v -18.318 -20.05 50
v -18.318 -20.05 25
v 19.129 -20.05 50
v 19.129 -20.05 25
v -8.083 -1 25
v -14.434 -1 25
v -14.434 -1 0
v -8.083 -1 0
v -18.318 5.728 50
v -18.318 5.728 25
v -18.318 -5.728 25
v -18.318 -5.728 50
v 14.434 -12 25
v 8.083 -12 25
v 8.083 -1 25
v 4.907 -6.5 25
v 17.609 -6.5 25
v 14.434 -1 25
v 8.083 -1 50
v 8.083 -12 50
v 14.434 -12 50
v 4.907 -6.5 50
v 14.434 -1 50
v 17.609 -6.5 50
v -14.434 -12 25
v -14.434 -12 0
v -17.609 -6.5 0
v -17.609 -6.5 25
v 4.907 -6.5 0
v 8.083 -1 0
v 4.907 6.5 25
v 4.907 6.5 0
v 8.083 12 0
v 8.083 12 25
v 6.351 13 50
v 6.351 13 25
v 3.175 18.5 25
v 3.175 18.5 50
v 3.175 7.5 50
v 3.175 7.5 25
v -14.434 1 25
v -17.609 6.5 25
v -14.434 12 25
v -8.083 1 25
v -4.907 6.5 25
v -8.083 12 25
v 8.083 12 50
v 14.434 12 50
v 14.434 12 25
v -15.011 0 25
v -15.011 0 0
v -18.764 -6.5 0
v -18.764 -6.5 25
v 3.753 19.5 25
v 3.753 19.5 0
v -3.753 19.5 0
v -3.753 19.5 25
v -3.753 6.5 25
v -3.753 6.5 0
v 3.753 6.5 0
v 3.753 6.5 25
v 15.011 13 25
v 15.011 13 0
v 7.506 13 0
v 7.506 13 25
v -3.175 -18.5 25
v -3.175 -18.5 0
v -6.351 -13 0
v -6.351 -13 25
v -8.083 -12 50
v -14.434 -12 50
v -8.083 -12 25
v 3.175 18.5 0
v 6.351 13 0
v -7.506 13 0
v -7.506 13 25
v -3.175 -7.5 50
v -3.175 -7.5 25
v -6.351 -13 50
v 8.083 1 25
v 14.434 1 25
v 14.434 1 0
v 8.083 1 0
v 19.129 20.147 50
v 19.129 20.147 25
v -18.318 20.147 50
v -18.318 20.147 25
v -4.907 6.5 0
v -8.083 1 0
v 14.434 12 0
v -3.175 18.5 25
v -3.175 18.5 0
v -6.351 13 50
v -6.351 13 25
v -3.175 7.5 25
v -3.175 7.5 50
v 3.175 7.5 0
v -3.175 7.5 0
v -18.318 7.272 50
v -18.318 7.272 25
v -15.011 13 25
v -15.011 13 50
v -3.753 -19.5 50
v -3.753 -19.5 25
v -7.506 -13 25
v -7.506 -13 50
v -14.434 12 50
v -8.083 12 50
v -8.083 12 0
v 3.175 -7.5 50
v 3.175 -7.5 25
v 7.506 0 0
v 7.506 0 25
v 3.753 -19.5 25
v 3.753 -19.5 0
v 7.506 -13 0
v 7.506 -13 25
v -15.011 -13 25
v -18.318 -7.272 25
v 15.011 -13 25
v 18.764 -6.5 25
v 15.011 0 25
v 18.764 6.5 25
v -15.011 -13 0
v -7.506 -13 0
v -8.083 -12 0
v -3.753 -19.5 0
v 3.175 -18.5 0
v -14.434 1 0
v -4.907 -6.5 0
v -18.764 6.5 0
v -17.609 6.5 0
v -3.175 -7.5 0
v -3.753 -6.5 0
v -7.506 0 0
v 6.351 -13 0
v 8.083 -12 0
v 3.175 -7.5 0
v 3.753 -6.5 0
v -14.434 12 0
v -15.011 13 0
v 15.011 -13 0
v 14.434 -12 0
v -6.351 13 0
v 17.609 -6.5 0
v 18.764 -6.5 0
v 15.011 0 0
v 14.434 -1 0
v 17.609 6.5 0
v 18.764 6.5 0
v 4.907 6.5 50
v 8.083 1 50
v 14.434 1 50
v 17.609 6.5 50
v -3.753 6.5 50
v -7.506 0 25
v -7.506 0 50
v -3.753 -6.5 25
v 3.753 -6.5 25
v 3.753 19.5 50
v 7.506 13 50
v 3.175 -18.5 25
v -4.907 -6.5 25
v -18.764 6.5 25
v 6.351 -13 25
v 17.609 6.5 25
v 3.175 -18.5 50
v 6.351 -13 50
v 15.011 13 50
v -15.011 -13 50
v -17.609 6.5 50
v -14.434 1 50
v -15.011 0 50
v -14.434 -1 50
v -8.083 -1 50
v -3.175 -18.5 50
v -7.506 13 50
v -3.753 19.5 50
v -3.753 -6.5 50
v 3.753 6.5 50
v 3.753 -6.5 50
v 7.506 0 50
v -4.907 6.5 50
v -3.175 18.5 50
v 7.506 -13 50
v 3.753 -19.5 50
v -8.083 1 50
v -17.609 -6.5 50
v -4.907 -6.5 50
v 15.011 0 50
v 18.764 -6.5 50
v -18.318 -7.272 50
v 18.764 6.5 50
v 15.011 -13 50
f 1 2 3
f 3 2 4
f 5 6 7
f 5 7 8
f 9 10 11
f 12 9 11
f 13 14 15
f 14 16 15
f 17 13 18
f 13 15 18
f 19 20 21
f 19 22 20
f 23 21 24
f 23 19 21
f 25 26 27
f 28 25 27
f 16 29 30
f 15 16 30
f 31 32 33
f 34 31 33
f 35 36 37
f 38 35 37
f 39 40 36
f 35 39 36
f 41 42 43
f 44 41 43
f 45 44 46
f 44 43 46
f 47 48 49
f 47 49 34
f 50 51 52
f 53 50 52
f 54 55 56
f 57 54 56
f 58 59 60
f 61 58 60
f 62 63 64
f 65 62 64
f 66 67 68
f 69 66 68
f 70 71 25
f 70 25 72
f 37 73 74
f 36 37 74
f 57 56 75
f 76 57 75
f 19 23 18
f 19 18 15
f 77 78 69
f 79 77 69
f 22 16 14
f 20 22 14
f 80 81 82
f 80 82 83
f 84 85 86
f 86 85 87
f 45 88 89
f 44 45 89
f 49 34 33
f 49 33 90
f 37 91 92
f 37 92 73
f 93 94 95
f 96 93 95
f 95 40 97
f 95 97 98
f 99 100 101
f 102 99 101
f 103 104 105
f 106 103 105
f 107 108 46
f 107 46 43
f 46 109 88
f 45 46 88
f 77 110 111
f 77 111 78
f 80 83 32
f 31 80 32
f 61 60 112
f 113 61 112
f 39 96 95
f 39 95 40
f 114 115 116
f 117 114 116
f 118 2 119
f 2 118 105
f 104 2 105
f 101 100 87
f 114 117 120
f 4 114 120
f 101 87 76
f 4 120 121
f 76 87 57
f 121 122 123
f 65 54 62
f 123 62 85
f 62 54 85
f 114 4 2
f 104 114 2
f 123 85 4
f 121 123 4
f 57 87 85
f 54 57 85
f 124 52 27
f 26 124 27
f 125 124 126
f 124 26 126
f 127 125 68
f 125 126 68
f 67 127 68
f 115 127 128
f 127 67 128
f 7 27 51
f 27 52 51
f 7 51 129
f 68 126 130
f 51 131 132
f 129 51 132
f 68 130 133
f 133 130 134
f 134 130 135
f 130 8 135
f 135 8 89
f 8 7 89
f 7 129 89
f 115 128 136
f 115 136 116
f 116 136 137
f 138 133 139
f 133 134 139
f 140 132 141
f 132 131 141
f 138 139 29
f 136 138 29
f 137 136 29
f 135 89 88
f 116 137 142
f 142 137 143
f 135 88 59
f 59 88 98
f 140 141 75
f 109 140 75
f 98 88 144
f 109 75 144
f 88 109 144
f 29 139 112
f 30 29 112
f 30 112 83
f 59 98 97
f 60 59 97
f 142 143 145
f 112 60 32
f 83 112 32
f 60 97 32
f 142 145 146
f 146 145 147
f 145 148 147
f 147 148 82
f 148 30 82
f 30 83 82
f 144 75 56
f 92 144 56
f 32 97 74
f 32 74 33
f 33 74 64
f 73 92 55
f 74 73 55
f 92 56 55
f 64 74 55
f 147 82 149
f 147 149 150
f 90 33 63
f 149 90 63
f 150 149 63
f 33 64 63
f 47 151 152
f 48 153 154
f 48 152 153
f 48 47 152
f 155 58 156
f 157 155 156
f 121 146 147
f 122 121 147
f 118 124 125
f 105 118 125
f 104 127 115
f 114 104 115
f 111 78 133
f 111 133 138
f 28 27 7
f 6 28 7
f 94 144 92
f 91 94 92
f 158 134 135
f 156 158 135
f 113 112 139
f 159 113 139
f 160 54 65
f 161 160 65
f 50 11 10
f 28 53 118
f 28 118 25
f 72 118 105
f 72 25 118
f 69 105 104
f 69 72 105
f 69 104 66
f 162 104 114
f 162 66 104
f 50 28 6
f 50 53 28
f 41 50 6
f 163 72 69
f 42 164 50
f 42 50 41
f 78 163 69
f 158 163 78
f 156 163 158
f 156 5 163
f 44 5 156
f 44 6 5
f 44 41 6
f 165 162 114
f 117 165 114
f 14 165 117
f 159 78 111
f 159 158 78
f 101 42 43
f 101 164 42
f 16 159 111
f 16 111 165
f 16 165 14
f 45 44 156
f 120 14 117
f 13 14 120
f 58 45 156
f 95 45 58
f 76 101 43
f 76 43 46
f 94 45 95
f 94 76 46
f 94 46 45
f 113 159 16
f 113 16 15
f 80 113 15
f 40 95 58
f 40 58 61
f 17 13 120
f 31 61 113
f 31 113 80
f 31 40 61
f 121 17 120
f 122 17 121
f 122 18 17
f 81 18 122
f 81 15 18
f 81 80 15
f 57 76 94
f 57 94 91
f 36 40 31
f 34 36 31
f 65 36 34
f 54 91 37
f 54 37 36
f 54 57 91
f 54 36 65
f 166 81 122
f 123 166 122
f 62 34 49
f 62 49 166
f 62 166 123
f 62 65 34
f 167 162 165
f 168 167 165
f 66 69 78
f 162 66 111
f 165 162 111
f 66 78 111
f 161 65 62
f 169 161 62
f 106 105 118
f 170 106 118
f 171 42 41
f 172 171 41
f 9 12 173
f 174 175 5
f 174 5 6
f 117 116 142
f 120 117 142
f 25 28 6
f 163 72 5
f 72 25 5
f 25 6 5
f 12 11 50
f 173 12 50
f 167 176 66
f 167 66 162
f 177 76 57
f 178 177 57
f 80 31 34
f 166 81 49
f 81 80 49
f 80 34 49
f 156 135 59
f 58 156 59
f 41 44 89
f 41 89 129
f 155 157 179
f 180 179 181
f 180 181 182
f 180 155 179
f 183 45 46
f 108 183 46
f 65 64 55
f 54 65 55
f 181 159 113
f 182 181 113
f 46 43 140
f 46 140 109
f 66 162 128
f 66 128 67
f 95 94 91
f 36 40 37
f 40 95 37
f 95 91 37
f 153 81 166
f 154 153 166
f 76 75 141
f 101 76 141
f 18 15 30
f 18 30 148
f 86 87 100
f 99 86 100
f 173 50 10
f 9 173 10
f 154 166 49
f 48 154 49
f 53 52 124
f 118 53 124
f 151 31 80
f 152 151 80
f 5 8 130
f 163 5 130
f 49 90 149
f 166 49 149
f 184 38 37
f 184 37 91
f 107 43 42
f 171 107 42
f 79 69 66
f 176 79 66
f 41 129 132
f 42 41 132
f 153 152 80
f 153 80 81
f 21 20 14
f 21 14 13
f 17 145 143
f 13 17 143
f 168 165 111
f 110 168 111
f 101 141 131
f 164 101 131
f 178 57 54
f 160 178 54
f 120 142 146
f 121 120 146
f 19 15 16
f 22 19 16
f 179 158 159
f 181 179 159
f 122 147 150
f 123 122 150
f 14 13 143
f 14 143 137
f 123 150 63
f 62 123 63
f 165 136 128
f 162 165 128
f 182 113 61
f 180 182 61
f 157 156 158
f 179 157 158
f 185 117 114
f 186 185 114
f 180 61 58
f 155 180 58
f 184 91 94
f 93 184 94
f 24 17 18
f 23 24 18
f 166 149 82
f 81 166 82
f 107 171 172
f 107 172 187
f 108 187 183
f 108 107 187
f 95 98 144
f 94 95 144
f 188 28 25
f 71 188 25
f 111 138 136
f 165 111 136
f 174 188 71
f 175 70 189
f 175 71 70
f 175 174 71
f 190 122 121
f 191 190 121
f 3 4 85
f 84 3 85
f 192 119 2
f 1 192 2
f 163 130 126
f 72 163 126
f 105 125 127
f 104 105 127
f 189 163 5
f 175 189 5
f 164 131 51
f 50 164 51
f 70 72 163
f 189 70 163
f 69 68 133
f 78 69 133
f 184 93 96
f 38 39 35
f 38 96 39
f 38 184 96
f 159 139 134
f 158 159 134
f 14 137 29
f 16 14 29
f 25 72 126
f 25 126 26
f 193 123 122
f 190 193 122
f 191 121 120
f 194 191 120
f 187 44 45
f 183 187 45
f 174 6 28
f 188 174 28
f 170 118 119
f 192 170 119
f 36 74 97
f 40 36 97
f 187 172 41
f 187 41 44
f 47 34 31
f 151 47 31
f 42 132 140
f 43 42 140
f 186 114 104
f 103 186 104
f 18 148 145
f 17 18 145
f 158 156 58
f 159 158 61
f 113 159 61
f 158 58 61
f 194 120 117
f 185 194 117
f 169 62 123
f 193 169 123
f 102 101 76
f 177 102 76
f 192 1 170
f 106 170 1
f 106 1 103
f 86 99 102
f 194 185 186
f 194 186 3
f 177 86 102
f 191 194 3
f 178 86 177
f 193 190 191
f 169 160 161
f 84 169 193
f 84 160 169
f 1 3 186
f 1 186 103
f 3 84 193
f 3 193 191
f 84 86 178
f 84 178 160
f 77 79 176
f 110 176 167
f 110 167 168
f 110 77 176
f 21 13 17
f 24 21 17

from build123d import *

# Parameters (mm, degrees)
F1_DEPTH = 25
F3_DEPTH = 25
F6_DEPTH = 25


with BuildPart() as f1:
    # F0 (on Top) → F1 (new body)
    with BuildSketch(Plane.XY):
        Polygon((-7.5055534995, 13), (-3.7527767497, 6.5), (3.7527767497, 6.5), (7.5055534995, 13), (3.7527767497, 19.5), (-3.7527767497, 19.5), align=None)
        Polygon((-3.1754264805, 7.5), (-6.3508529611, 13), (-3.1754264805, 18.5), (3.1754264805, 18.5), (6.3508529611, 13), (3.1754264805, 7.5), align=None, mode=Mode.SUBTRACT)
        Polygon((-7.5055534995, 0), (-3.7527767497, 6.5), (-7.5055534995, 13), (-15.0111069989, 13), (-18.7638837487, 6.5), (-15.0111069989, 0), align=None)
        Polygon((-8.0829037687, 1), (-14.4337567297, 1), (-17.6091832103, 6.5), (-14.4337567297, 12), (-8.0829037687, 12), (-4.9074772881, 6.5), align=None, mode=Mode.SUBTRACT)
        Polygon((7.5055534995, 13), (3.7527767497, 6.5), (7.5055534995, 0), (15.0111069989, 0), (18.7638837487, 6.5), (15.0111069989, 13), align=None)
        Polygon((8.0829037687, 1), (4.9074772881, 6.5), (8.0829037687, 12), (14.4337567297, 12), (17.6091832103, 6.5), (14.4337567297, 1), align=None, mode=Mode.SUBTRACT)
        Polygon((-3.7527767497, -6.5), (-7.5055534995, 0), (-15.0111069989, 0), (-18.7638837487, -6.5), (-15.0111069989, -13), (-7.5055534995, -13), align=None)
        Polygon((-14.4337567297, -12), (-17.6091832103, -6.5), (-14.4337567297, -1), (-8.0829037687, -1), (-4.9074772881, -6.5), (-8.0829037687, -12), align=None, mode=Mode.SUBTRACT)
        Polygon((15.0111069989, 0), (7.5055534995, 0), (3.7527767497, -6.5), (7.5055534995, -13), (15.0111069989, -13), (18.7638837487, -6.5), align=None)
        Polygon((8.0829037687, -12), (4.9074772881, -6.5), (8.0829037687, -1), (14.4337567297, -1), (17.6091832103, -6.5), (14.4337567297, -12), align=None, mode=Mode.SUBTRACT)
        Polygon((3.7527767497, -6.5), (-3.7527767497, -6.5), (-7.5055534995, -13), (-3.7527767497, -19.5), (3.7527767497, -19.5), (7.5055534995, -13), align=None)
        Polygon((3.1754264805, -18.5), (-3.1754264805, -18.5), (-6.3508529611, -13), (-3.1754264805, -7.5), (3.1754264805, -7.5), (6.3508529611, -13), align=None, mode=Mode.SUBTRACT)
    extrude(amount=F1_DEPTH)

    # F2 (on face) → F3 (join)
    with BuildSketch(Plane.XY.offset(25)):
        Polygon((3.7527767497, -19.5), (7.5055534995, -13), (15.0111069989, -13), (18.7638837487, -6.5), (15.0111069989, 0), (18.7638837487, 6.5), (15.0111069989, 13), (7.5055534995, 13), (3.7527767497, 19.5), (-3.7527767497, 19.5), (-7.5055534995, 13), (-15.0111069989, 13), (-18.7638837487, 6.5), (-15.0111069989, 0), (-18.7638837487, -6.5), (-15.0111069989, -13), (-7.5055534995, -13), (-3.7527767497, -19.5), align=None)
        Polygon((-8.0829037687, -1), (-4.9074772881, -6.5), (-8.0829037687, -12), (-14.4337567297, -12), (-17.6091832103, -6.5), (-14.4337567297, -1), align=None, mode=Mode.SUBTRACT)
        Polygon((-6.3508529611, -13), (-3.1754264805, -7.5), (3.1754264805, -7.5), (6.3508529611, -13), (3.1754264805, -18.5), (-3.1754264805, -18.5), align=None, mode=Mode.SUBTRACT)
        Polygon((17.6091832103, -6.5), (14.4337567297, -12), (8.0829037687, -12), (4.9074772881, -6.5), (8.0829037687, -1), (14.4337567297, -1), align=None, mode=Mode.SUBTRACT)
        Polygon((-14.4337567297, 12), (-8.0829037687, 12), (-4.9074772881, 6.5), (-8.0829037687, 1), (-14.4337567297, 1), (-17.6091832103, 6.5), align=None, mode=Mode.SUBTRACT)
        Polygon((3.1754264805, 18.5), (6.3508529611, 13), (3.1754264805, 7.5), (-3.1754264805, 7.5), (-6.3508529611, 13), (-3.1754264805, 18.5), align=None, mode=Mode.SUBTRACT)
        Polygon((-7.5055534995, 0), (-3.7527767497, 6.5), (3.7527767497, 6.5), (7.5055534995, 0), (3.7527767497, -6.5), (-3.7527767497, -6.5), align=None, mode=Mode.SUBTRACT)
        Polygon((14.4337567297, 12), (17.6091832103, 6.5), (14.4337567297, 1), (8.0829037687, 1), (4.9074772881, 6.5), (8.0829037687, 12), align=None, mode=Mode.SUBTRACT)
    extrude(amount=-F3_DEPTH)


with BuildPart() as f6:
    # F5 (on face) → F6 (new body)
    with BuildSketch(Plane.XY.offset(25)):
        Polygon((-15.0111069989, 0), (-18.3182880282, 5.7282055726), (-18.3182880282, -5.7282055726), align=None)
    extrude(amount=F6_DEPTH)


with BuildPart() as f6b:
    # F5 (on face) → F6, piece 2 (new body)
    with BuildSketch(Plane.XY.offset(25)):
        Polygon((-18.3182880282, -20.0500637293), (8.5395220667, -20.0500637293), (8.5395220667, -13), (7.5055534995, -13), (3.7527767497, -19.5), (-3.7527767497, -19.5), (-7.5055534995, -13), (-15.0111069989, -13), (-18.3182880282, -7.2717944274), (-18.3182880282, -19.2839857191), align=None)
        Polygon((19.1294308752, 20.1465263963), (8.5395220667, 20.1465263963), (8.5395220667, 13), (15.0111069989, 13), (18.7638837487, 6.5), (15.0111069989, 0), (18.7638837487, -6.5), (15.0111069989, -13), (8.5395220667, -13), (8.5395220667, -20.0500637293), (19.1294308752, -20.0500637293), align=None)
        Polygon((8.5395220667, 20.1465263963), (-18.3182880282, 20.1465263963), (-18.3182880282, 7.2717944274), (-15.0111069989, 13), (-7.5055534995, 13), (-3.7527767497, 19.5), (3.7527767497, 19.5), (7.5055534995, 13), (8.5395220667, 13), align=None)
    extrude(amount=F6_DEPTH)


with BuildPart() as f6c:
    # F4 (on face) → F6, piece 3 (new body)
    with BuildSketch(Plane.XY.offset(25)):
        Polygon((-4.9074772881, 6.5), (-8.0829037687, 12), (-14.4337567297, 12), (-17.6091832103, 6.5), (-14.4337567297, 1), (-8.0829037687, 1), align=None)
    extrude(amount=F6_DEPTH)


with BuildPart() as f6d:
    # F4 (on face) → F6, piece 4 (new body)
    with BuildSketch(Plane.XY.offset(25)):
        Polygon((-8.0829037687, -12), (-4.9074772881, -6.5), (-8.0829037687, -1), (-14.4337567297, -1), (-17.6091832103, -6.5), (-14.4337567297, -12), align=None)
    extrude(amount=F6_DEPTH)


with BuildPart() as f6e:
    # F4 (on face) → F6, piece 5 (new body)
    with BuildSketch(Plane.XY.offset(25)):
        Polygon((3.7527767497, 6.5), (-3.7527767497, 6.5), (-7.5055534995, 0), (-3.7527767497, -6.5), (3.7527767497, -6.5), (7.5055534995, 0), align=None)
    extrude(amount=F6_DEPTH)


with BuildPart() as f6f:
    # F4 (on face) → F6, piece 6 (new body)
    with BuildSketch(Plane.XY.offset(25)):
        Polygon((3.1754264805, -7.5), (-3.1754264805, -7.5), (-6.3508529611, -13), (-3.1754264805, -18.5), (3.1754264805, -18.5), (6.3508529611, -13), align=None)
    extrude(amount=F6_DEPTH)


with BuildPart() as f6g:
    # F4 (on face) → F6, piece 7 (new body)
    with BuildSketch(Plane.XY.offset(25)):
        Polygon((8.0829037687, -12), (14.4337567297, -12), (17.6091832103, -6.5), (14.4337567297, -1), (8.0829037687, -1), (4.9074772881, -6.5), align=None)
    extrude(amount=F6_DEPTH)


with BuildPart() as f6h:
    # F4 (on face) → F6, piece 8 (new body)
    with BuildSketch(Plane.XY.offset(25)):
        Polygon((14.4337567297, 1), (17.6091832103, 6.5), (14.4337567297, 12), (8.0829037687, 12), (4.9074772881, 6.5), (8.0829037687, 1), align=None)
    extrude(amount=F6_DEPTH)


with BuildPart() as f6i:
    # F4 (on face) → F6, piece 9 (new body)
    with BuildSketch(Plane.XY.offset(25)):
        Polygon((3.1754264805, 7.5), (6.3508529611, 13), (3.1754264805, 18.5), (-3.1754264805, 18.5), (-6.3508529611, 13), (-3.1754264805, 7.5), align=None)
    extrude(amount=F6_DEPTH)


solid = Compound([f1.part, f6.part, f6b.part, f6c.part, f6d.part, f6e.part, f6f.part, f6g.part, f6h.part, f6i.part])
